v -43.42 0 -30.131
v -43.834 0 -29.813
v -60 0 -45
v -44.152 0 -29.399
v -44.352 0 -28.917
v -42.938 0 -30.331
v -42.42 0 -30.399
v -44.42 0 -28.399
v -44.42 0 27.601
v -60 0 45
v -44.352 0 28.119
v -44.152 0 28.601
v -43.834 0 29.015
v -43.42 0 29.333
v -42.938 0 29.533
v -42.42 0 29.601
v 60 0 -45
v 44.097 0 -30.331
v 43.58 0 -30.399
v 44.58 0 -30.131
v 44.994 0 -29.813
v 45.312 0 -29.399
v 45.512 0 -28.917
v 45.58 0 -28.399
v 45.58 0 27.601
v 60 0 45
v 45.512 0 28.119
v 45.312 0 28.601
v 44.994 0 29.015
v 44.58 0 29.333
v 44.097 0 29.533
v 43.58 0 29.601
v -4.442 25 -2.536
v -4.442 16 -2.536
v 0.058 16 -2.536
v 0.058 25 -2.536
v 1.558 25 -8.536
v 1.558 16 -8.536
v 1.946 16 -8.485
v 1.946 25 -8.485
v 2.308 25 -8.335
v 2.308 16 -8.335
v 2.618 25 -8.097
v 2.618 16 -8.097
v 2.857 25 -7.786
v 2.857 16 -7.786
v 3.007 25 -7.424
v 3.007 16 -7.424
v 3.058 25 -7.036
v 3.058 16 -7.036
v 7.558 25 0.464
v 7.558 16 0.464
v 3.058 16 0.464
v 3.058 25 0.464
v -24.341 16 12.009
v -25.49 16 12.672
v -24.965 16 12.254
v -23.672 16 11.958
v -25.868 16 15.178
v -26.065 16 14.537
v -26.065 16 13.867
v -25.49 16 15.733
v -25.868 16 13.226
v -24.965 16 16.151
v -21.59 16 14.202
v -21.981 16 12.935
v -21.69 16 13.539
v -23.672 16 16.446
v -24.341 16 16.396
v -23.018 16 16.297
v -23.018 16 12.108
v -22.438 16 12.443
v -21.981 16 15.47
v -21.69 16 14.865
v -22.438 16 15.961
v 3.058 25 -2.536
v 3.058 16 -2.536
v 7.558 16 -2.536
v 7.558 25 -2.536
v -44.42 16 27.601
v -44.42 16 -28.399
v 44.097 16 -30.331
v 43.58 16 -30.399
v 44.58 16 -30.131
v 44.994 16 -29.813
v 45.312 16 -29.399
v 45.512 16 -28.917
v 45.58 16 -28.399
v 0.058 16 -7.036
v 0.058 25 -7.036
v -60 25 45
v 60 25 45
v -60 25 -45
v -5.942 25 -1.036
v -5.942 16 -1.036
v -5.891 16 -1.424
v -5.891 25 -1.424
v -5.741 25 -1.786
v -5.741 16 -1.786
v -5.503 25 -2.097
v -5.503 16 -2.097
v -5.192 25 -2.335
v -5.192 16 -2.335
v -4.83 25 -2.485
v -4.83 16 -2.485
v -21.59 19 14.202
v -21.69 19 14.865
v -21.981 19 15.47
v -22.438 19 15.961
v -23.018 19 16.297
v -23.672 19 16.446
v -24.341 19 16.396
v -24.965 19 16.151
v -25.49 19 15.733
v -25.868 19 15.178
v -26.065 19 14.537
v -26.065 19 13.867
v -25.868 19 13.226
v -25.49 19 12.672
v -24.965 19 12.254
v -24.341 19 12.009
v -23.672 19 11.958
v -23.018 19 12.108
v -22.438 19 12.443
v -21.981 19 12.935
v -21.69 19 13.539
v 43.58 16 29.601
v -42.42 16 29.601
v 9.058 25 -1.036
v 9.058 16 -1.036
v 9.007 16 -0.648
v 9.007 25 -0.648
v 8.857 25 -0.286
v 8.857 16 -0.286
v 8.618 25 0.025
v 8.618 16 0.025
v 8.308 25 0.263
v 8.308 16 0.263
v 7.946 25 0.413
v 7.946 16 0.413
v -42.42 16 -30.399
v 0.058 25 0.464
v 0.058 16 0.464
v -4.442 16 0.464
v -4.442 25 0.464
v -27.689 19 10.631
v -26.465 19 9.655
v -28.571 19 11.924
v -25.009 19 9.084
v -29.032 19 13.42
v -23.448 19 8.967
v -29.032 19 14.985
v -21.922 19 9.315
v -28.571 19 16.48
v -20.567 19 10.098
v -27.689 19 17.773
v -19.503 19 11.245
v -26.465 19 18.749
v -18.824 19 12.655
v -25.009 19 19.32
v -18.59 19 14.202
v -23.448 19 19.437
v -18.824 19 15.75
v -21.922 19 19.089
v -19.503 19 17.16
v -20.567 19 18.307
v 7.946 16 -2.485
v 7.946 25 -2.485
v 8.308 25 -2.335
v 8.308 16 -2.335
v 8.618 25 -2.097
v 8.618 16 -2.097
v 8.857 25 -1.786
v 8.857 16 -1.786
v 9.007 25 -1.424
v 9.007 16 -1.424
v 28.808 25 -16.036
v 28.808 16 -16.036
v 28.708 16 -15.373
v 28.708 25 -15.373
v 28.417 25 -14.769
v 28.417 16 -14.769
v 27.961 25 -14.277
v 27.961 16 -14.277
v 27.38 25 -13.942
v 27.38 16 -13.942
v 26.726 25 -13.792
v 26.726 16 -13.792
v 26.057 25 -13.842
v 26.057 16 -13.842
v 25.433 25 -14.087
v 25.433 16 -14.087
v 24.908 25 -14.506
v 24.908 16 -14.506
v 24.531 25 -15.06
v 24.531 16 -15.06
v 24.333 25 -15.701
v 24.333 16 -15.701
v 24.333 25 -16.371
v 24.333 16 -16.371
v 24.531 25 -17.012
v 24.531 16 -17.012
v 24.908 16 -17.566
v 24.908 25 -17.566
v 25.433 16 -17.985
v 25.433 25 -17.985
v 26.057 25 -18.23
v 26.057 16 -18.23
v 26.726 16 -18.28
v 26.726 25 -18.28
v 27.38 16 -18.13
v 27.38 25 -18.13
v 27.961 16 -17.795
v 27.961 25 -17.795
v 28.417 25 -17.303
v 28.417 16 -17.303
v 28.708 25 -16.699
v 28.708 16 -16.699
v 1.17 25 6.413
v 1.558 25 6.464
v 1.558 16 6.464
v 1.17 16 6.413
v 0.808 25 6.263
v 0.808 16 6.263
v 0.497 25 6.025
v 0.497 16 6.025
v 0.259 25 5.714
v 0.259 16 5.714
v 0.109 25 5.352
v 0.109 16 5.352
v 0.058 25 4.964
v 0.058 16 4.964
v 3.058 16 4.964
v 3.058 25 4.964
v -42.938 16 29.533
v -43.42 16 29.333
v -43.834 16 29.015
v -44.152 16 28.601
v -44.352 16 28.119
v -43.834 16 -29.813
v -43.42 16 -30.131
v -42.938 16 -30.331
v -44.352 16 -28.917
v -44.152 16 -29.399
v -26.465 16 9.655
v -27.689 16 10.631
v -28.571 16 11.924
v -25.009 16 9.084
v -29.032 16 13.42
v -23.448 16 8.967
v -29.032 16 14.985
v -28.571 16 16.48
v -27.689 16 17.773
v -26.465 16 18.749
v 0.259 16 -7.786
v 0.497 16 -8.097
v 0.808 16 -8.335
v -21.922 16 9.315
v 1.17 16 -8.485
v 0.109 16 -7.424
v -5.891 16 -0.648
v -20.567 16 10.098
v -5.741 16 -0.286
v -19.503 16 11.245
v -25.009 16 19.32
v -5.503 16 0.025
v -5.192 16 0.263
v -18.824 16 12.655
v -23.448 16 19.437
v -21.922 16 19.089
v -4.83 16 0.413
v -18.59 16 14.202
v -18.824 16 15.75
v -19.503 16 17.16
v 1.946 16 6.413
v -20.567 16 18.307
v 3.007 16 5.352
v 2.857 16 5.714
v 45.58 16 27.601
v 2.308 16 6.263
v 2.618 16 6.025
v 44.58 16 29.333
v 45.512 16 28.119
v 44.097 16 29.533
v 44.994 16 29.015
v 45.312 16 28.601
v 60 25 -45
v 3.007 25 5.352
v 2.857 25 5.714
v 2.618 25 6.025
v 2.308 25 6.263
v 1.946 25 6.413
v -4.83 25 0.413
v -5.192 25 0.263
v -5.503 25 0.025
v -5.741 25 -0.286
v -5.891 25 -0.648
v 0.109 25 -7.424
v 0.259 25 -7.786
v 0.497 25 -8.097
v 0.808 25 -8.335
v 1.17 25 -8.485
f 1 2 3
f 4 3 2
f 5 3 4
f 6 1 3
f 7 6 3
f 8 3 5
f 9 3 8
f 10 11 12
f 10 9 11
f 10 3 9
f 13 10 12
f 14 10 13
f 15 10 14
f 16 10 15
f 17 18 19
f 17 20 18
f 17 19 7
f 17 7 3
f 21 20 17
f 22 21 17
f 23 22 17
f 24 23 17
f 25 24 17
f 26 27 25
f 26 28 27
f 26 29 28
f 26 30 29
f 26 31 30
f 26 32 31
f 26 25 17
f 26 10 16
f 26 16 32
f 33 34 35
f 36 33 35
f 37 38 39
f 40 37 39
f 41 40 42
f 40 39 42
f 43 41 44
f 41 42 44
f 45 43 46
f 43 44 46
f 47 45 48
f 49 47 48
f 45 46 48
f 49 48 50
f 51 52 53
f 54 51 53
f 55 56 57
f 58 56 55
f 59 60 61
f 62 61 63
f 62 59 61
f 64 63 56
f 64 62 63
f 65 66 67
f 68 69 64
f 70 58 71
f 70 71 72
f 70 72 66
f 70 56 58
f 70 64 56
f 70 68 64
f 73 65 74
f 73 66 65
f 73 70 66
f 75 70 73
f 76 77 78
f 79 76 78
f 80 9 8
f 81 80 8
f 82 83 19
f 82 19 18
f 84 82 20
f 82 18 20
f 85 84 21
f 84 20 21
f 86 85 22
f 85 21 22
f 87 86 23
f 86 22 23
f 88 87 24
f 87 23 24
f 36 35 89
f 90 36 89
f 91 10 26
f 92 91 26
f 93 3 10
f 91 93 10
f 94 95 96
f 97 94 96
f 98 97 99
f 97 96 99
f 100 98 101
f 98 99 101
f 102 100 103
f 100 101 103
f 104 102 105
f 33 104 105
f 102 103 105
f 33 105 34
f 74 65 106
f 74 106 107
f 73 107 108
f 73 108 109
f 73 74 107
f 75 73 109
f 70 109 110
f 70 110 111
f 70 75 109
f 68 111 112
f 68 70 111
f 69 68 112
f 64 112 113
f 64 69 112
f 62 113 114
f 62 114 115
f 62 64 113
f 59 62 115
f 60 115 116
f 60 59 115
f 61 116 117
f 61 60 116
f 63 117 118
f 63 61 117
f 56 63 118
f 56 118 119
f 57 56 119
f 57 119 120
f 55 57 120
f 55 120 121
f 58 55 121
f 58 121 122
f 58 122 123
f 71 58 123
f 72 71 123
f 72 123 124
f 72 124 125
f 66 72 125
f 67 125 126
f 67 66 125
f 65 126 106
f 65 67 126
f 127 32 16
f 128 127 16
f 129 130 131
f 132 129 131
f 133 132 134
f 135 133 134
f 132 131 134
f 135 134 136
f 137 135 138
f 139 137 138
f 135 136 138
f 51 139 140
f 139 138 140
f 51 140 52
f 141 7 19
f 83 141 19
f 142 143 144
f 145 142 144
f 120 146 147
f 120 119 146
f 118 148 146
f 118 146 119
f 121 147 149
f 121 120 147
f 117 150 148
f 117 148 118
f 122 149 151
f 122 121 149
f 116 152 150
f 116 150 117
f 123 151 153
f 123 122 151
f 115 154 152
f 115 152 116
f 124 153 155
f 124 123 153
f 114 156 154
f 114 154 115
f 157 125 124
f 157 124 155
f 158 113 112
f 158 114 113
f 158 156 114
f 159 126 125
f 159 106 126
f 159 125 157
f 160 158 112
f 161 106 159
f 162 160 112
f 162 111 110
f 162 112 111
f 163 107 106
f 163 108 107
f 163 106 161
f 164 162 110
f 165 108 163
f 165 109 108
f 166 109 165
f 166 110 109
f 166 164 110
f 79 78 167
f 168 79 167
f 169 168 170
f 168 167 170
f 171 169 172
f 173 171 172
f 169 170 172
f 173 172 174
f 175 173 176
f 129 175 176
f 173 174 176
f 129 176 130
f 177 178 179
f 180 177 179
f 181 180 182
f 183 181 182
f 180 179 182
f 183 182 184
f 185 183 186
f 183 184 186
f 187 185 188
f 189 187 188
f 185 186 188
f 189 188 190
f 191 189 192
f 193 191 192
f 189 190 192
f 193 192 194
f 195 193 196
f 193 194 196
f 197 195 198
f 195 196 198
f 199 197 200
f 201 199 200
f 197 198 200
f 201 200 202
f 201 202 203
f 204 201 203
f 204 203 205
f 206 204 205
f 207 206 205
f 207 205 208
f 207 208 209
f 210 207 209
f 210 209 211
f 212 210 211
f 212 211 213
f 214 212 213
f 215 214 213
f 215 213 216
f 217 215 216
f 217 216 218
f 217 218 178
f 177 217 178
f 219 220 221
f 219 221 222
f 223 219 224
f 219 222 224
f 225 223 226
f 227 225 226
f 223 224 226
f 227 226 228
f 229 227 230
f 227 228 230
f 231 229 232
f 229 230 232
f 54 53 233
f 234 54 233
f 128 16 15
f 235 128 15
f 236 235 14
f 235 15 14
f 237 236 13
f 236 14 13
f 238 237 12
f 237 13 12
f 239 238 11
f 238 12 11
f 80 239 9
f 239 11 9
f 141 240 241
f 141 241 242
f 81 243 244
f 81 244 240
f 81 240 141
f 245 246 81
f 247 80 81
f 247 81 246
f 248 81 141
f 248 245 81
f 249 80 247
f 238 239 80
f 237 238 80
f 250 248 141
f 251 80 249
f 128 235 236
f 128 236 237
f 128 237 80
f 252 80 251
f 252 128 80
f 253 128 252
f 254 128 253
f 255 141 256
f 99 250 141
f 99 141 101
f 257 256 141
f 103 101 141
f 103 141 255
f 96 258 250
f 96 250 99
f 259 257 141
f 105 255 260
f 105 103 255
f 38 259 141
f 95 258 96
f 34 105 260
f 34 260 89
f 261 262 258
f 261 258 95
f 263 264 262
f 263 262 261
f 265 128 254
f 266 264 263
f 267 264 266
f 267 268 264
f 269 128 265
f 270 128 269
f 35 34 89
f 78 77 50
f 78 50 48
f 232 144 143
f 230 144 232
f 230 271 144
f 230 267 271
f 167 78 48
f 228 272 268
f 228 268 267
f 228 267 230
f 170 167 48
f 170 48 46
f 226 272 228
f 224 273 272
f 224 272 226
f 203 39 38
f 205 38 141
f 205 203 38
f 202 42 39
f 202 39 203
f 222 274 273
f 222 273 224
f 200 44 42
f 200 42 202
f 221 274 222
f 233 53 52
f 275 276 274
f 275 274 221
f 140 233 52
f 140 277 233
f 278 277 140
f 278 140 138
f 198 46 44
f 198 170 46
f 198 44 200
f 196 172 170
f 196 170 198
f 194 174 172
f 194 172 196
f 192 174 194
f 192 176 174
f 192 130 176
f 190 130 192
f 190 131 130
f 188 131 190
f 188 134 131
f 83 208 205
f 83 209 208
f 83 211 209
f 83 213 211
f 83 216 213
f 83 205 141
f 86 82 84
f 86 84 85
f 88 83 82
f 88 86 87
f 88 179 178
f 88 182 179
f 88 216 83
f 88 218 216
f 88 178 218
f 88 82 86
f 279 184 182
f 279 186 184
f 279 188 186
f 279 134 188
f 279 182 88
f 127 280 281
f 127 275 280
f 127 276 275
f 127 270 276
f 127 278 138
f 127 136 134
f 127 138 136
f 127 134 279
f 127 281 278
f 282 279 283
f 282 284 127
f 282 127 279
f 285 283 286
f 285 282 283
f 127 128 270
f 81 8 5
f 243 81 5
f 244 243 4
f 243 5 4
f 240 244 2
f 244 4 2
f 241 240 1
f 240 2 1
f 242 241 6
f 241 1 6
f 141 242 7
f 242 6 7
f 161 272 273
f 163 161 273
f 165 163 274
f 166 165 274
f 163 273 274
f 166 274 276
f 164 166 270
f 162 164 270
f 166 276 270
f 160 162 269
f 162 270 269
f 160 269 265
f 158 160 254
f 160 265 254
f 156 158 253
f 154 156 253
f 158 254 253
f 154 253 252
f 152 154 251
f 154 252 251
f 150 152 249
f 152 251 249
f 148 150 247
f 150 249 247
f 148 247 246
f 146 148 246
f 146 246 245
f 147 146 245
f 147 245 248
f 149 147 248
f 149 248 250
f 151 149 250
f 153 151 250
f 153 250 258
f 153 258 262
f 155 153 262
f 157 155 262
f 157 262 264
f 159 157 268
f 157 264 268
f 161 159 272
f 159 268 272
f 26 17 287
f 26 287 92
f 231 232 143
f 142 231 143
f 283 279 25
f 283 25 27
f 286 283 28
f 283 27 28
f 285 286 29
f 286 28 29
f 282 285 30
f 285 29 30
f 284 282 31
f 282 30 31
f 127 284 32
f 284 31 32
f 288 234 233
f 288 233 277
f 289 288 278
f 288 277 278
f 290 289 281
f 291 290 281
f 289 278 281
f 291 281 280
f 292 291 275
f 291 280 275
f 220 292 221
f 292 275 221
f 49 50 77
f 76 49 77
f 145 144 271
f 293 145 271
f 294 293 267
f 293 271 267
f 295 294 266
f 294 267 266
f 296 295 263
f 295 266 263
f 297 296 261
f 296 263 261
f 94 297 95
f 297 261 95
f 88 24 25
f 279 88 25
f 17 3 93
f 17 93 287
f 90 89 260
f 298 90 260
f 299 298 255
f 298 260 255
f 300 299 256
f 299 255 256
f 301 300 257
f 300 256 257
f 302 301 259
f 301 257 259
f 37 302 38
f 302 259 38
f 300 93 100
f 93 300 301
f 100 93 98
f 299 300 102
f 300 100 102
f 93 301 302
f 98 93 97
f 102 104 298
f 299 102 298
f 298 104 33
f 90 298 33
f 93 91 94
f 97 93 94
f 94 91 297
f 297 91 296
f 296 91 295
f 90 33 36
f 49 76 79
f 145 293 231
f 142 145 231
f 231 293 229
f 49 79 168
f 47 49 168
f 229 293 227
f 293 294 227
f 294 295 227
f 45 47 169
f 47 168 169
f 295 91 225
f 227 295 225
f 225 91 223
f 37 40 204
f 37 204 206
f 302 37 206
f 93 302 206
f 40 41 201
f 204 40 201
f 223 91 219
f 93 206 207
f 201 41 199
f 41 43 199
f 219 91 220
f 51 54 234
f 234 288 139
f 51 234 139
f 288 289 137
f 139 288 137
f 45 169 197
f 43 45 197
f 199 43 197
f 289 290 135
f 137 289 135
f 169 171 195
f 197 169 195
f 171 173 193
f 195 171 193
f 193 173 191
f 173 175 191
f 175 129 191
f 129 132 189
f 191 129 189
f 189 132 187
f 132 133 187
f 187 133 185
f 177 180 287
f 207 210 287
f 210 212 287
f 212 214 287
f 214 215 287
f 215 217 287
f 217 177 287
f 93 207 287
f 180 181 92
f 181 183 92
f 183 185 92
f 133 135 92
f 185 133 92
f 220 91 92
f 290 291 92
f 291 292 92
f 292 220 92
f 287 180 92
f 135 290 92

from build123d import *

# Parameters (mm, degrees)
F0_W     = 120
F0_H     = 90
F0_R     = 2.25
F0_R_2   = 5.25
F1_DEPTH = 25
F2_R     = 2.25
F2_R_2   = 5.25
F3_DEPTH = 16
F4_R     = 5.25
F4_R_2   = 2.25
F5_DEPTH = 3
F6_R     = 2.25
F7_DEPTH = 9.001


with BuildPart() as f1:
    # F0 (on Front) → F1 (new body)
    with BuildSketch(Plane.XZ):
        Rectangle(F0_W, F0_H)
        with BuildLine():
            Line((-43, 30), (43, 30))
            ThreePointArc((43, 30), (44.4142135624, 29.4142135624), (45, 28))
            Line((45, 28), (45, -28))
            ThreePointArc((45, -28), (44.4142135624, -29.4142135624), (43, -30))
            Line((43, -30), (-43, -30))
            ThreePointArc((-43, -30), (-44.4142135624, -29.4142135624), (-45, -28))
            Line((-45, -28), (-45, 28))
            ThreePointArc((-45, 28), (-44.4142135624, 29.4142135624), (-43, 30))
        make_face(mode=Mode.SUBTRACT)
        with BuildLine():
            ThreePointArc((45, 28), (44.4142135624, 29.4142135624), (43, 30))
            Line((43, 30), (-43, 30))
            ThreePointArc((-43, 30), (-44.4142135624, 29.4142135624), (-45, 28))
            Line((-45, 28), (-45, -28))
            ThreePointArc((-45, -28), (-44.4142135624, -29.4142135624), (-43, -30))
            Line((-43, -30), (43, -30))
            ThreePointArc((43, -30), (44.4142135624, -29.4142135624), (45, -28))
            Line((45, -28), (45, 28))
        make_face()
        with Locations((25, -15)):
            Circle(F0_R, mode=Mode.SUBTRACT)
        with Locations((-25, 15)):
            Circle(F0_R_2, mode=Mode.SUBTRACT)
        with BuildLine():
            Line((1.5, 1.5), (6, 1.5))
            ThreePointArc((6, 1.5), (7.0606601718, 1.0606601718), (7.5, 0))
            ThreePointArc((7.5, 0), (7.0606601718, -1.0606601718), (6, -1.5))
            Line((6, -1.5), (1.5, -1.5))
            Line((1.5, -1.5), (1.5, -6))
            ThreePointArc((1.5, -6), (1.0606601718, -7.0606601718), (0, -7.5))
            ThreePointArc((0, -7.5), (-1.0606601718, -7.0606601718), (-1.5, -6))
            Line((-1.5, -6), (-1.5, -1.5))
            Line((-1.5, -1.5), (-6, -1.5))
            ThreePointArc((-6, -1.5), (-7.0606601718, -1.0606601718), (-7.5, 0))
            ThreePointArc((-7.5, 0), (-7.0606601718, 1.0606601718), (-6, 1.5))
            Line((-6, 1.5), (-1.5, 1.5))
            Line((-1.5, 1.5), (-1.5, 6))
            ThreePointArc((-1.5, 6), (-1.0606601718, 7.0606601718), (0, 7.5))
            ThreePointArc((0, 7.5), (1.0606601718, 7.0606601718), (1.5, 6))
            Line((1.5, 6), (1.5, 1.5))
        make_face(mode=Mode.SUBTRACT)
        with Locations((-25, 15)):
            Circle(F0_R_2)
        with Locations((-25, 15)):
            Circle(F0_R, mode=Mode.SUBTRACT)
        with BuildLine():
            ThreePointArc((7.5, 0), (7.0606601718, 1.0606601718), (6, 1.5))
            Line((6, 1.5), (1.5, 1.5))
            Line((1.5, 1.5), (1.5, 6))
            ThreePointArc((1.5, 6), (1.0606601718, 7.0606601718), (0, 7.5))
            ThreePointArc((0, 7.5), (-1.0606601718, 7.0606601718), (-1.5, 6))
            Line((-1.5, 6), (-1.5, 1.5))
            Line((-1.5, 1.5), (-6, 1.5))
            ThreePointArc((-6, 1.5), (-7.0606601718, 1.0606601718), (-7.5, 0))
            ThreePointArc((-7.5, 0), (-7.0606601718, -1.0606601718), (-6, -1.5))
            Line((-6, -1.5), (-1.5, -1.5))
            Line((-1.5, -1.5), (-1.5, -6))
            ThreePointArc((-1.5, -6), (-1.0606601718, -7.0606601718), (0, -7.5))
            ThreePointArc((0, -7.5), (1.0606601718, -7.0606601718), (1.5, -6))
            Line((1.5, -6), (1.5, -1.5))
            Line((1.5, -1.5), (6, -1.5))
            ThreePointArc((6, -1.5), (7.0606601718, -1.0606601718), (7.5, 0))
        make_face()
        with Locations((-25, 15)):
            Circle(F0_R)
        with Locations((25, -15)):
            Circle(F0_R)
    extrude(amount=-F1_DEPTH)

    # F2 (on face) → F3 (cut)
    with BuildSketch(Plane.XZ):
        with BuildLine():
            ThreePointArc((45.579787234, 27.6010638298), (44.9940007964, 29.0152773922), (43.579787234, 29.6010638298))
            Line((43.579787234, 29.6010638298), (-42.420212766, 29.6010638298))
            ThreePointArc((-42.420212766, 29.6010638298), (-43.8344263283, 29.0152773922), (-44.420212766, 27.6010638298))
            Line((-44.420212766, 27.6010638298), (-44.420212766, -28.3989361702))
            ThreePointArc((-44.420212766, -28.3989361702), (-43.8344263283, -29.8131497326), (-42.420212766, -30.3989361702))
            Line((-42.420212766, -30.3989361702), (43.579787234, -30.3989361702))
            ThreePointArc((43.579787234, -30.3989361702), (44.9940007964, -29.8131497326), (45.579787234, -28.3989361702))
            Line((45.579787234, -28.3989361702), (45.579787234, 27.6010638298))
        make_face()
        with Locations((25.579787234, -15.3989361702)):
            Circle(F2_R, mode=Mode.SUBTRACT)
        with BuildLine():
            Line((2.079787234, 1.1010638298), (6.579787234, 1.1010638298))
            ThreePointArc((6.579787234, 1.1010638298), (7.6404474058, 0.6617240016), (8.079787234, -0.3989361702))
            ThreePointArc((8.079787234, -0.3989361702), (7.6404474058, -1.459596342), (6.579787234, -1.8989361702))
            Line((6.579787234, -1.8989361702), (2.079787234, -1.8989361702))
            Line((2.079787234, -1.8989361702), (2.079787234, -6.3989361702))
            ThreePointArc((2.079787234, -6.3989361702), (1.6404474058, -7.459596342), (0.579787234, -7.8989361702))
            ThreePointArc((0.579787234, -7.8989361702), (-0.4808729377, -7.459596342), (-0.920212766, -6.3989361702))
            Line((-0.920212766, -6.3989361702), (-0.920212766, -1.8989361702))
            Line((-0.920212766, -1.8989361702), (-5.420212766, -1.8989361702))
            ThreePointArc((-5.420212766, -1.8989361702), (-6.4808729377, -1.459596342), (-6.920212766, -0.3989361702))
            ThreePointArc((-6.920212766, -0.3989361702), (-6.4808729377, 0.6617240016), (-5.420212766, 1.1010638298))
            Line((-5.420212766, 1.1010638298), (-0.920212766, 1.1010638298))
            Line((-0.920212766, 1.1010638298), (-0.920212766, 5.6010638298))
            ThreePointArc((-0.920212766, 5.6010638298), (-0.4808729377, 6.6617240016), (0.579787234, 7.1010638298))
            ThreePointArc((0.579787234, 7.1010638298), (1.6404474058, 6.6617240016), (2.079787234, 5.6010638298))
            Line((2.079787234, 5.6010638298), (2.079787234, 1.1010638298))
        make_face(mode=Mode.SUBTRACT)
        with Locations((-24.420212766, 14.6010638298)):
            Circle(F2_R_2, mode=Mode.SUBTRACT)
        with Locations((-24.420212766, 14.6010638298)):
            Circle(F2_R_2)
        with Locations((-24.420212766, 14.6010638298)):
            Circle(F2_R, mode=Mode.SUBTRACT)
        with Locations((-24.420212766, 14.6010638298)):
            Circle(F2_R)
        with BuildLine():
            ThreePointArc((8.079787234, -0.3989361702), (7.6404474058, 0.6617240016), (6.579787234, 1.1010638298))
            Line((6.579787234, 1.1010638298), (2.079787234, 1.1010638298))
            Line((2.079787234, 1.1010638298), (2.079787234, 5.6010638298))
            ThreePointArc((2.079787234, 5.6010638298), (1.6404474058, 6.6617240016), (0.579787234, 7.1010638298))
            ThreePointArc((0.579787234, 7.1010638298), (-0.4808729377, 6.6617240016), (-0.920212766, 5.6010638298))
            Line((-0.920212766, 5.6010638298), (-0.920212766, 1.1010638298))
            Line((-0.920212766, 1.1010638298), (-5.420212766, 1.1010638298))
            ThreePointArc((-5.420212766, 1.1010638298), (-6.4808729377, 0.6617240016), (-6.920212766, -0.3989361702))
            ThreePointArc((-6.920212766, -0.3989361702), (-6.4808729377, -1.459596342), (-5.420212766, -1.8989361702))
            Line((-5.420212766, -1.8989361702), (-0.920212766, -1.8989361702))
            Line((-0.920212766, -1.8989361702), (-0.920212766, -6.3989361702))
            ThreePointArc((-0.920212766, -6.3989361702), (-0.4808729377, -7.459596342), (0.579787234, -7.8989361702))
            ThreePointArc((0.579787234, -7.8989361702), (1.6404474058, -7.459596342), (2.079787234, -6.3989361702))
            Line((2.079787234, -6.3989361702), (2.079787234, -1.8989361702))
            Line((2.079787234, -1.8989361702), (6.579787234, -1.8989361702))
            ThreePointArc((6.579787234, -1.8989361702), (7.6404474058, -1.459596342), (8.079787234, -0.3989361702))
        make_face()
        with Locations((25.579787234, -15.3989361702)):
            Circle(F2_R)
    extrude(amount=-F3_DEPTH, mode=Mode.SUBTRACT)

    # F4 (on face) → F5 (cut)
    with BuildSketch(Plane.XZ.offset(-16)):
        with Locations((-23.8404255319, 14.2021276596)):
            Circle(F4_R)
        with Locations((-23.8404255319, 14.2021276596)):
            Circle(F4_R_2, mode=Mode.SUBTRACT)
    extrude(amount=-F5_DEPTH, mode=Mode.SUBTRACT)

    # F6 (on face) → F7 (cut, through all)
    with BuildSketch(Plane.XZ.offset(-16)):
        with BuildLine():
            ThreePointArc((9.0577965574, -1.0359728926), (8.6184567292, 0.0246872792), (7.5577965574, 0.4640271074))
            Line((7.5577965574, 0.4640271074), (3.0577965574, 0.4640271074))
            Line((3.0577965574, 0.4640271074), (3.0577965574, 4.9640271074))
            ThreePointArc((3.0577965574, 4.9640271074), (2.6184567292, 6.0246872792), (1.5577965574, 6.4640271074))
            ThreePointArc((1.5577965574, 6.4640271074), (0.4971363856, 6.0246872792), (0.0577965574, 4.9640271074))
            Line((0.0577965574, 4.9640271074), (0.0577965574, 0.4640271074))
            Line((0.0577965574, 0.4640271074), (-4.4422034426, 0.4640271074))
            ThreePointArc((-4.4422034426, 0.4640271074), (-5.5028636144, 0.0246872792), (-5.9422034426, -1.0359728926))
            ThreePointArc((-5.9422034426, -1.0359728926), (-5.5028636144, -2.0966330644), (-4.4422034426, -2.5359728926))
            Line((-4.4422034426, -2.5359728926), (0.0577965574, -2.5359728926))
            Line((0.0577965574, -2.5359728926), (0.0577965574, -7.0359728926))
            ThreePointArc((0.0577965574, -7.0359728926), (0.4971363856, -8.0966330644), (1.5577965574, -8.5359728926))
            ThreePointArc((1.5577965574, -8.5359728926), (2.6184567292, -8.0966330644), (3.0577965574, -7.0359728926))
            Line((3.0577965574, -7.0359728926), (3.0577965574, -2.5359728926))
            Line((3.0577965574, -2.5359728926), (7.5577965574, -2.5359728926))
            ThreePointArc((7.5577965574, -2.5359728926), (8.6184567292, -2.0966330644), (9.0577965574, -1.0359728926))
        make_face()
        with Locations((26.5577965574, -16.0359728926)):
            Circle(F6_R)
    extrude(amount=-F7_DEPTH, mode=Mode.SUBTRACT)


solid = f1.part
